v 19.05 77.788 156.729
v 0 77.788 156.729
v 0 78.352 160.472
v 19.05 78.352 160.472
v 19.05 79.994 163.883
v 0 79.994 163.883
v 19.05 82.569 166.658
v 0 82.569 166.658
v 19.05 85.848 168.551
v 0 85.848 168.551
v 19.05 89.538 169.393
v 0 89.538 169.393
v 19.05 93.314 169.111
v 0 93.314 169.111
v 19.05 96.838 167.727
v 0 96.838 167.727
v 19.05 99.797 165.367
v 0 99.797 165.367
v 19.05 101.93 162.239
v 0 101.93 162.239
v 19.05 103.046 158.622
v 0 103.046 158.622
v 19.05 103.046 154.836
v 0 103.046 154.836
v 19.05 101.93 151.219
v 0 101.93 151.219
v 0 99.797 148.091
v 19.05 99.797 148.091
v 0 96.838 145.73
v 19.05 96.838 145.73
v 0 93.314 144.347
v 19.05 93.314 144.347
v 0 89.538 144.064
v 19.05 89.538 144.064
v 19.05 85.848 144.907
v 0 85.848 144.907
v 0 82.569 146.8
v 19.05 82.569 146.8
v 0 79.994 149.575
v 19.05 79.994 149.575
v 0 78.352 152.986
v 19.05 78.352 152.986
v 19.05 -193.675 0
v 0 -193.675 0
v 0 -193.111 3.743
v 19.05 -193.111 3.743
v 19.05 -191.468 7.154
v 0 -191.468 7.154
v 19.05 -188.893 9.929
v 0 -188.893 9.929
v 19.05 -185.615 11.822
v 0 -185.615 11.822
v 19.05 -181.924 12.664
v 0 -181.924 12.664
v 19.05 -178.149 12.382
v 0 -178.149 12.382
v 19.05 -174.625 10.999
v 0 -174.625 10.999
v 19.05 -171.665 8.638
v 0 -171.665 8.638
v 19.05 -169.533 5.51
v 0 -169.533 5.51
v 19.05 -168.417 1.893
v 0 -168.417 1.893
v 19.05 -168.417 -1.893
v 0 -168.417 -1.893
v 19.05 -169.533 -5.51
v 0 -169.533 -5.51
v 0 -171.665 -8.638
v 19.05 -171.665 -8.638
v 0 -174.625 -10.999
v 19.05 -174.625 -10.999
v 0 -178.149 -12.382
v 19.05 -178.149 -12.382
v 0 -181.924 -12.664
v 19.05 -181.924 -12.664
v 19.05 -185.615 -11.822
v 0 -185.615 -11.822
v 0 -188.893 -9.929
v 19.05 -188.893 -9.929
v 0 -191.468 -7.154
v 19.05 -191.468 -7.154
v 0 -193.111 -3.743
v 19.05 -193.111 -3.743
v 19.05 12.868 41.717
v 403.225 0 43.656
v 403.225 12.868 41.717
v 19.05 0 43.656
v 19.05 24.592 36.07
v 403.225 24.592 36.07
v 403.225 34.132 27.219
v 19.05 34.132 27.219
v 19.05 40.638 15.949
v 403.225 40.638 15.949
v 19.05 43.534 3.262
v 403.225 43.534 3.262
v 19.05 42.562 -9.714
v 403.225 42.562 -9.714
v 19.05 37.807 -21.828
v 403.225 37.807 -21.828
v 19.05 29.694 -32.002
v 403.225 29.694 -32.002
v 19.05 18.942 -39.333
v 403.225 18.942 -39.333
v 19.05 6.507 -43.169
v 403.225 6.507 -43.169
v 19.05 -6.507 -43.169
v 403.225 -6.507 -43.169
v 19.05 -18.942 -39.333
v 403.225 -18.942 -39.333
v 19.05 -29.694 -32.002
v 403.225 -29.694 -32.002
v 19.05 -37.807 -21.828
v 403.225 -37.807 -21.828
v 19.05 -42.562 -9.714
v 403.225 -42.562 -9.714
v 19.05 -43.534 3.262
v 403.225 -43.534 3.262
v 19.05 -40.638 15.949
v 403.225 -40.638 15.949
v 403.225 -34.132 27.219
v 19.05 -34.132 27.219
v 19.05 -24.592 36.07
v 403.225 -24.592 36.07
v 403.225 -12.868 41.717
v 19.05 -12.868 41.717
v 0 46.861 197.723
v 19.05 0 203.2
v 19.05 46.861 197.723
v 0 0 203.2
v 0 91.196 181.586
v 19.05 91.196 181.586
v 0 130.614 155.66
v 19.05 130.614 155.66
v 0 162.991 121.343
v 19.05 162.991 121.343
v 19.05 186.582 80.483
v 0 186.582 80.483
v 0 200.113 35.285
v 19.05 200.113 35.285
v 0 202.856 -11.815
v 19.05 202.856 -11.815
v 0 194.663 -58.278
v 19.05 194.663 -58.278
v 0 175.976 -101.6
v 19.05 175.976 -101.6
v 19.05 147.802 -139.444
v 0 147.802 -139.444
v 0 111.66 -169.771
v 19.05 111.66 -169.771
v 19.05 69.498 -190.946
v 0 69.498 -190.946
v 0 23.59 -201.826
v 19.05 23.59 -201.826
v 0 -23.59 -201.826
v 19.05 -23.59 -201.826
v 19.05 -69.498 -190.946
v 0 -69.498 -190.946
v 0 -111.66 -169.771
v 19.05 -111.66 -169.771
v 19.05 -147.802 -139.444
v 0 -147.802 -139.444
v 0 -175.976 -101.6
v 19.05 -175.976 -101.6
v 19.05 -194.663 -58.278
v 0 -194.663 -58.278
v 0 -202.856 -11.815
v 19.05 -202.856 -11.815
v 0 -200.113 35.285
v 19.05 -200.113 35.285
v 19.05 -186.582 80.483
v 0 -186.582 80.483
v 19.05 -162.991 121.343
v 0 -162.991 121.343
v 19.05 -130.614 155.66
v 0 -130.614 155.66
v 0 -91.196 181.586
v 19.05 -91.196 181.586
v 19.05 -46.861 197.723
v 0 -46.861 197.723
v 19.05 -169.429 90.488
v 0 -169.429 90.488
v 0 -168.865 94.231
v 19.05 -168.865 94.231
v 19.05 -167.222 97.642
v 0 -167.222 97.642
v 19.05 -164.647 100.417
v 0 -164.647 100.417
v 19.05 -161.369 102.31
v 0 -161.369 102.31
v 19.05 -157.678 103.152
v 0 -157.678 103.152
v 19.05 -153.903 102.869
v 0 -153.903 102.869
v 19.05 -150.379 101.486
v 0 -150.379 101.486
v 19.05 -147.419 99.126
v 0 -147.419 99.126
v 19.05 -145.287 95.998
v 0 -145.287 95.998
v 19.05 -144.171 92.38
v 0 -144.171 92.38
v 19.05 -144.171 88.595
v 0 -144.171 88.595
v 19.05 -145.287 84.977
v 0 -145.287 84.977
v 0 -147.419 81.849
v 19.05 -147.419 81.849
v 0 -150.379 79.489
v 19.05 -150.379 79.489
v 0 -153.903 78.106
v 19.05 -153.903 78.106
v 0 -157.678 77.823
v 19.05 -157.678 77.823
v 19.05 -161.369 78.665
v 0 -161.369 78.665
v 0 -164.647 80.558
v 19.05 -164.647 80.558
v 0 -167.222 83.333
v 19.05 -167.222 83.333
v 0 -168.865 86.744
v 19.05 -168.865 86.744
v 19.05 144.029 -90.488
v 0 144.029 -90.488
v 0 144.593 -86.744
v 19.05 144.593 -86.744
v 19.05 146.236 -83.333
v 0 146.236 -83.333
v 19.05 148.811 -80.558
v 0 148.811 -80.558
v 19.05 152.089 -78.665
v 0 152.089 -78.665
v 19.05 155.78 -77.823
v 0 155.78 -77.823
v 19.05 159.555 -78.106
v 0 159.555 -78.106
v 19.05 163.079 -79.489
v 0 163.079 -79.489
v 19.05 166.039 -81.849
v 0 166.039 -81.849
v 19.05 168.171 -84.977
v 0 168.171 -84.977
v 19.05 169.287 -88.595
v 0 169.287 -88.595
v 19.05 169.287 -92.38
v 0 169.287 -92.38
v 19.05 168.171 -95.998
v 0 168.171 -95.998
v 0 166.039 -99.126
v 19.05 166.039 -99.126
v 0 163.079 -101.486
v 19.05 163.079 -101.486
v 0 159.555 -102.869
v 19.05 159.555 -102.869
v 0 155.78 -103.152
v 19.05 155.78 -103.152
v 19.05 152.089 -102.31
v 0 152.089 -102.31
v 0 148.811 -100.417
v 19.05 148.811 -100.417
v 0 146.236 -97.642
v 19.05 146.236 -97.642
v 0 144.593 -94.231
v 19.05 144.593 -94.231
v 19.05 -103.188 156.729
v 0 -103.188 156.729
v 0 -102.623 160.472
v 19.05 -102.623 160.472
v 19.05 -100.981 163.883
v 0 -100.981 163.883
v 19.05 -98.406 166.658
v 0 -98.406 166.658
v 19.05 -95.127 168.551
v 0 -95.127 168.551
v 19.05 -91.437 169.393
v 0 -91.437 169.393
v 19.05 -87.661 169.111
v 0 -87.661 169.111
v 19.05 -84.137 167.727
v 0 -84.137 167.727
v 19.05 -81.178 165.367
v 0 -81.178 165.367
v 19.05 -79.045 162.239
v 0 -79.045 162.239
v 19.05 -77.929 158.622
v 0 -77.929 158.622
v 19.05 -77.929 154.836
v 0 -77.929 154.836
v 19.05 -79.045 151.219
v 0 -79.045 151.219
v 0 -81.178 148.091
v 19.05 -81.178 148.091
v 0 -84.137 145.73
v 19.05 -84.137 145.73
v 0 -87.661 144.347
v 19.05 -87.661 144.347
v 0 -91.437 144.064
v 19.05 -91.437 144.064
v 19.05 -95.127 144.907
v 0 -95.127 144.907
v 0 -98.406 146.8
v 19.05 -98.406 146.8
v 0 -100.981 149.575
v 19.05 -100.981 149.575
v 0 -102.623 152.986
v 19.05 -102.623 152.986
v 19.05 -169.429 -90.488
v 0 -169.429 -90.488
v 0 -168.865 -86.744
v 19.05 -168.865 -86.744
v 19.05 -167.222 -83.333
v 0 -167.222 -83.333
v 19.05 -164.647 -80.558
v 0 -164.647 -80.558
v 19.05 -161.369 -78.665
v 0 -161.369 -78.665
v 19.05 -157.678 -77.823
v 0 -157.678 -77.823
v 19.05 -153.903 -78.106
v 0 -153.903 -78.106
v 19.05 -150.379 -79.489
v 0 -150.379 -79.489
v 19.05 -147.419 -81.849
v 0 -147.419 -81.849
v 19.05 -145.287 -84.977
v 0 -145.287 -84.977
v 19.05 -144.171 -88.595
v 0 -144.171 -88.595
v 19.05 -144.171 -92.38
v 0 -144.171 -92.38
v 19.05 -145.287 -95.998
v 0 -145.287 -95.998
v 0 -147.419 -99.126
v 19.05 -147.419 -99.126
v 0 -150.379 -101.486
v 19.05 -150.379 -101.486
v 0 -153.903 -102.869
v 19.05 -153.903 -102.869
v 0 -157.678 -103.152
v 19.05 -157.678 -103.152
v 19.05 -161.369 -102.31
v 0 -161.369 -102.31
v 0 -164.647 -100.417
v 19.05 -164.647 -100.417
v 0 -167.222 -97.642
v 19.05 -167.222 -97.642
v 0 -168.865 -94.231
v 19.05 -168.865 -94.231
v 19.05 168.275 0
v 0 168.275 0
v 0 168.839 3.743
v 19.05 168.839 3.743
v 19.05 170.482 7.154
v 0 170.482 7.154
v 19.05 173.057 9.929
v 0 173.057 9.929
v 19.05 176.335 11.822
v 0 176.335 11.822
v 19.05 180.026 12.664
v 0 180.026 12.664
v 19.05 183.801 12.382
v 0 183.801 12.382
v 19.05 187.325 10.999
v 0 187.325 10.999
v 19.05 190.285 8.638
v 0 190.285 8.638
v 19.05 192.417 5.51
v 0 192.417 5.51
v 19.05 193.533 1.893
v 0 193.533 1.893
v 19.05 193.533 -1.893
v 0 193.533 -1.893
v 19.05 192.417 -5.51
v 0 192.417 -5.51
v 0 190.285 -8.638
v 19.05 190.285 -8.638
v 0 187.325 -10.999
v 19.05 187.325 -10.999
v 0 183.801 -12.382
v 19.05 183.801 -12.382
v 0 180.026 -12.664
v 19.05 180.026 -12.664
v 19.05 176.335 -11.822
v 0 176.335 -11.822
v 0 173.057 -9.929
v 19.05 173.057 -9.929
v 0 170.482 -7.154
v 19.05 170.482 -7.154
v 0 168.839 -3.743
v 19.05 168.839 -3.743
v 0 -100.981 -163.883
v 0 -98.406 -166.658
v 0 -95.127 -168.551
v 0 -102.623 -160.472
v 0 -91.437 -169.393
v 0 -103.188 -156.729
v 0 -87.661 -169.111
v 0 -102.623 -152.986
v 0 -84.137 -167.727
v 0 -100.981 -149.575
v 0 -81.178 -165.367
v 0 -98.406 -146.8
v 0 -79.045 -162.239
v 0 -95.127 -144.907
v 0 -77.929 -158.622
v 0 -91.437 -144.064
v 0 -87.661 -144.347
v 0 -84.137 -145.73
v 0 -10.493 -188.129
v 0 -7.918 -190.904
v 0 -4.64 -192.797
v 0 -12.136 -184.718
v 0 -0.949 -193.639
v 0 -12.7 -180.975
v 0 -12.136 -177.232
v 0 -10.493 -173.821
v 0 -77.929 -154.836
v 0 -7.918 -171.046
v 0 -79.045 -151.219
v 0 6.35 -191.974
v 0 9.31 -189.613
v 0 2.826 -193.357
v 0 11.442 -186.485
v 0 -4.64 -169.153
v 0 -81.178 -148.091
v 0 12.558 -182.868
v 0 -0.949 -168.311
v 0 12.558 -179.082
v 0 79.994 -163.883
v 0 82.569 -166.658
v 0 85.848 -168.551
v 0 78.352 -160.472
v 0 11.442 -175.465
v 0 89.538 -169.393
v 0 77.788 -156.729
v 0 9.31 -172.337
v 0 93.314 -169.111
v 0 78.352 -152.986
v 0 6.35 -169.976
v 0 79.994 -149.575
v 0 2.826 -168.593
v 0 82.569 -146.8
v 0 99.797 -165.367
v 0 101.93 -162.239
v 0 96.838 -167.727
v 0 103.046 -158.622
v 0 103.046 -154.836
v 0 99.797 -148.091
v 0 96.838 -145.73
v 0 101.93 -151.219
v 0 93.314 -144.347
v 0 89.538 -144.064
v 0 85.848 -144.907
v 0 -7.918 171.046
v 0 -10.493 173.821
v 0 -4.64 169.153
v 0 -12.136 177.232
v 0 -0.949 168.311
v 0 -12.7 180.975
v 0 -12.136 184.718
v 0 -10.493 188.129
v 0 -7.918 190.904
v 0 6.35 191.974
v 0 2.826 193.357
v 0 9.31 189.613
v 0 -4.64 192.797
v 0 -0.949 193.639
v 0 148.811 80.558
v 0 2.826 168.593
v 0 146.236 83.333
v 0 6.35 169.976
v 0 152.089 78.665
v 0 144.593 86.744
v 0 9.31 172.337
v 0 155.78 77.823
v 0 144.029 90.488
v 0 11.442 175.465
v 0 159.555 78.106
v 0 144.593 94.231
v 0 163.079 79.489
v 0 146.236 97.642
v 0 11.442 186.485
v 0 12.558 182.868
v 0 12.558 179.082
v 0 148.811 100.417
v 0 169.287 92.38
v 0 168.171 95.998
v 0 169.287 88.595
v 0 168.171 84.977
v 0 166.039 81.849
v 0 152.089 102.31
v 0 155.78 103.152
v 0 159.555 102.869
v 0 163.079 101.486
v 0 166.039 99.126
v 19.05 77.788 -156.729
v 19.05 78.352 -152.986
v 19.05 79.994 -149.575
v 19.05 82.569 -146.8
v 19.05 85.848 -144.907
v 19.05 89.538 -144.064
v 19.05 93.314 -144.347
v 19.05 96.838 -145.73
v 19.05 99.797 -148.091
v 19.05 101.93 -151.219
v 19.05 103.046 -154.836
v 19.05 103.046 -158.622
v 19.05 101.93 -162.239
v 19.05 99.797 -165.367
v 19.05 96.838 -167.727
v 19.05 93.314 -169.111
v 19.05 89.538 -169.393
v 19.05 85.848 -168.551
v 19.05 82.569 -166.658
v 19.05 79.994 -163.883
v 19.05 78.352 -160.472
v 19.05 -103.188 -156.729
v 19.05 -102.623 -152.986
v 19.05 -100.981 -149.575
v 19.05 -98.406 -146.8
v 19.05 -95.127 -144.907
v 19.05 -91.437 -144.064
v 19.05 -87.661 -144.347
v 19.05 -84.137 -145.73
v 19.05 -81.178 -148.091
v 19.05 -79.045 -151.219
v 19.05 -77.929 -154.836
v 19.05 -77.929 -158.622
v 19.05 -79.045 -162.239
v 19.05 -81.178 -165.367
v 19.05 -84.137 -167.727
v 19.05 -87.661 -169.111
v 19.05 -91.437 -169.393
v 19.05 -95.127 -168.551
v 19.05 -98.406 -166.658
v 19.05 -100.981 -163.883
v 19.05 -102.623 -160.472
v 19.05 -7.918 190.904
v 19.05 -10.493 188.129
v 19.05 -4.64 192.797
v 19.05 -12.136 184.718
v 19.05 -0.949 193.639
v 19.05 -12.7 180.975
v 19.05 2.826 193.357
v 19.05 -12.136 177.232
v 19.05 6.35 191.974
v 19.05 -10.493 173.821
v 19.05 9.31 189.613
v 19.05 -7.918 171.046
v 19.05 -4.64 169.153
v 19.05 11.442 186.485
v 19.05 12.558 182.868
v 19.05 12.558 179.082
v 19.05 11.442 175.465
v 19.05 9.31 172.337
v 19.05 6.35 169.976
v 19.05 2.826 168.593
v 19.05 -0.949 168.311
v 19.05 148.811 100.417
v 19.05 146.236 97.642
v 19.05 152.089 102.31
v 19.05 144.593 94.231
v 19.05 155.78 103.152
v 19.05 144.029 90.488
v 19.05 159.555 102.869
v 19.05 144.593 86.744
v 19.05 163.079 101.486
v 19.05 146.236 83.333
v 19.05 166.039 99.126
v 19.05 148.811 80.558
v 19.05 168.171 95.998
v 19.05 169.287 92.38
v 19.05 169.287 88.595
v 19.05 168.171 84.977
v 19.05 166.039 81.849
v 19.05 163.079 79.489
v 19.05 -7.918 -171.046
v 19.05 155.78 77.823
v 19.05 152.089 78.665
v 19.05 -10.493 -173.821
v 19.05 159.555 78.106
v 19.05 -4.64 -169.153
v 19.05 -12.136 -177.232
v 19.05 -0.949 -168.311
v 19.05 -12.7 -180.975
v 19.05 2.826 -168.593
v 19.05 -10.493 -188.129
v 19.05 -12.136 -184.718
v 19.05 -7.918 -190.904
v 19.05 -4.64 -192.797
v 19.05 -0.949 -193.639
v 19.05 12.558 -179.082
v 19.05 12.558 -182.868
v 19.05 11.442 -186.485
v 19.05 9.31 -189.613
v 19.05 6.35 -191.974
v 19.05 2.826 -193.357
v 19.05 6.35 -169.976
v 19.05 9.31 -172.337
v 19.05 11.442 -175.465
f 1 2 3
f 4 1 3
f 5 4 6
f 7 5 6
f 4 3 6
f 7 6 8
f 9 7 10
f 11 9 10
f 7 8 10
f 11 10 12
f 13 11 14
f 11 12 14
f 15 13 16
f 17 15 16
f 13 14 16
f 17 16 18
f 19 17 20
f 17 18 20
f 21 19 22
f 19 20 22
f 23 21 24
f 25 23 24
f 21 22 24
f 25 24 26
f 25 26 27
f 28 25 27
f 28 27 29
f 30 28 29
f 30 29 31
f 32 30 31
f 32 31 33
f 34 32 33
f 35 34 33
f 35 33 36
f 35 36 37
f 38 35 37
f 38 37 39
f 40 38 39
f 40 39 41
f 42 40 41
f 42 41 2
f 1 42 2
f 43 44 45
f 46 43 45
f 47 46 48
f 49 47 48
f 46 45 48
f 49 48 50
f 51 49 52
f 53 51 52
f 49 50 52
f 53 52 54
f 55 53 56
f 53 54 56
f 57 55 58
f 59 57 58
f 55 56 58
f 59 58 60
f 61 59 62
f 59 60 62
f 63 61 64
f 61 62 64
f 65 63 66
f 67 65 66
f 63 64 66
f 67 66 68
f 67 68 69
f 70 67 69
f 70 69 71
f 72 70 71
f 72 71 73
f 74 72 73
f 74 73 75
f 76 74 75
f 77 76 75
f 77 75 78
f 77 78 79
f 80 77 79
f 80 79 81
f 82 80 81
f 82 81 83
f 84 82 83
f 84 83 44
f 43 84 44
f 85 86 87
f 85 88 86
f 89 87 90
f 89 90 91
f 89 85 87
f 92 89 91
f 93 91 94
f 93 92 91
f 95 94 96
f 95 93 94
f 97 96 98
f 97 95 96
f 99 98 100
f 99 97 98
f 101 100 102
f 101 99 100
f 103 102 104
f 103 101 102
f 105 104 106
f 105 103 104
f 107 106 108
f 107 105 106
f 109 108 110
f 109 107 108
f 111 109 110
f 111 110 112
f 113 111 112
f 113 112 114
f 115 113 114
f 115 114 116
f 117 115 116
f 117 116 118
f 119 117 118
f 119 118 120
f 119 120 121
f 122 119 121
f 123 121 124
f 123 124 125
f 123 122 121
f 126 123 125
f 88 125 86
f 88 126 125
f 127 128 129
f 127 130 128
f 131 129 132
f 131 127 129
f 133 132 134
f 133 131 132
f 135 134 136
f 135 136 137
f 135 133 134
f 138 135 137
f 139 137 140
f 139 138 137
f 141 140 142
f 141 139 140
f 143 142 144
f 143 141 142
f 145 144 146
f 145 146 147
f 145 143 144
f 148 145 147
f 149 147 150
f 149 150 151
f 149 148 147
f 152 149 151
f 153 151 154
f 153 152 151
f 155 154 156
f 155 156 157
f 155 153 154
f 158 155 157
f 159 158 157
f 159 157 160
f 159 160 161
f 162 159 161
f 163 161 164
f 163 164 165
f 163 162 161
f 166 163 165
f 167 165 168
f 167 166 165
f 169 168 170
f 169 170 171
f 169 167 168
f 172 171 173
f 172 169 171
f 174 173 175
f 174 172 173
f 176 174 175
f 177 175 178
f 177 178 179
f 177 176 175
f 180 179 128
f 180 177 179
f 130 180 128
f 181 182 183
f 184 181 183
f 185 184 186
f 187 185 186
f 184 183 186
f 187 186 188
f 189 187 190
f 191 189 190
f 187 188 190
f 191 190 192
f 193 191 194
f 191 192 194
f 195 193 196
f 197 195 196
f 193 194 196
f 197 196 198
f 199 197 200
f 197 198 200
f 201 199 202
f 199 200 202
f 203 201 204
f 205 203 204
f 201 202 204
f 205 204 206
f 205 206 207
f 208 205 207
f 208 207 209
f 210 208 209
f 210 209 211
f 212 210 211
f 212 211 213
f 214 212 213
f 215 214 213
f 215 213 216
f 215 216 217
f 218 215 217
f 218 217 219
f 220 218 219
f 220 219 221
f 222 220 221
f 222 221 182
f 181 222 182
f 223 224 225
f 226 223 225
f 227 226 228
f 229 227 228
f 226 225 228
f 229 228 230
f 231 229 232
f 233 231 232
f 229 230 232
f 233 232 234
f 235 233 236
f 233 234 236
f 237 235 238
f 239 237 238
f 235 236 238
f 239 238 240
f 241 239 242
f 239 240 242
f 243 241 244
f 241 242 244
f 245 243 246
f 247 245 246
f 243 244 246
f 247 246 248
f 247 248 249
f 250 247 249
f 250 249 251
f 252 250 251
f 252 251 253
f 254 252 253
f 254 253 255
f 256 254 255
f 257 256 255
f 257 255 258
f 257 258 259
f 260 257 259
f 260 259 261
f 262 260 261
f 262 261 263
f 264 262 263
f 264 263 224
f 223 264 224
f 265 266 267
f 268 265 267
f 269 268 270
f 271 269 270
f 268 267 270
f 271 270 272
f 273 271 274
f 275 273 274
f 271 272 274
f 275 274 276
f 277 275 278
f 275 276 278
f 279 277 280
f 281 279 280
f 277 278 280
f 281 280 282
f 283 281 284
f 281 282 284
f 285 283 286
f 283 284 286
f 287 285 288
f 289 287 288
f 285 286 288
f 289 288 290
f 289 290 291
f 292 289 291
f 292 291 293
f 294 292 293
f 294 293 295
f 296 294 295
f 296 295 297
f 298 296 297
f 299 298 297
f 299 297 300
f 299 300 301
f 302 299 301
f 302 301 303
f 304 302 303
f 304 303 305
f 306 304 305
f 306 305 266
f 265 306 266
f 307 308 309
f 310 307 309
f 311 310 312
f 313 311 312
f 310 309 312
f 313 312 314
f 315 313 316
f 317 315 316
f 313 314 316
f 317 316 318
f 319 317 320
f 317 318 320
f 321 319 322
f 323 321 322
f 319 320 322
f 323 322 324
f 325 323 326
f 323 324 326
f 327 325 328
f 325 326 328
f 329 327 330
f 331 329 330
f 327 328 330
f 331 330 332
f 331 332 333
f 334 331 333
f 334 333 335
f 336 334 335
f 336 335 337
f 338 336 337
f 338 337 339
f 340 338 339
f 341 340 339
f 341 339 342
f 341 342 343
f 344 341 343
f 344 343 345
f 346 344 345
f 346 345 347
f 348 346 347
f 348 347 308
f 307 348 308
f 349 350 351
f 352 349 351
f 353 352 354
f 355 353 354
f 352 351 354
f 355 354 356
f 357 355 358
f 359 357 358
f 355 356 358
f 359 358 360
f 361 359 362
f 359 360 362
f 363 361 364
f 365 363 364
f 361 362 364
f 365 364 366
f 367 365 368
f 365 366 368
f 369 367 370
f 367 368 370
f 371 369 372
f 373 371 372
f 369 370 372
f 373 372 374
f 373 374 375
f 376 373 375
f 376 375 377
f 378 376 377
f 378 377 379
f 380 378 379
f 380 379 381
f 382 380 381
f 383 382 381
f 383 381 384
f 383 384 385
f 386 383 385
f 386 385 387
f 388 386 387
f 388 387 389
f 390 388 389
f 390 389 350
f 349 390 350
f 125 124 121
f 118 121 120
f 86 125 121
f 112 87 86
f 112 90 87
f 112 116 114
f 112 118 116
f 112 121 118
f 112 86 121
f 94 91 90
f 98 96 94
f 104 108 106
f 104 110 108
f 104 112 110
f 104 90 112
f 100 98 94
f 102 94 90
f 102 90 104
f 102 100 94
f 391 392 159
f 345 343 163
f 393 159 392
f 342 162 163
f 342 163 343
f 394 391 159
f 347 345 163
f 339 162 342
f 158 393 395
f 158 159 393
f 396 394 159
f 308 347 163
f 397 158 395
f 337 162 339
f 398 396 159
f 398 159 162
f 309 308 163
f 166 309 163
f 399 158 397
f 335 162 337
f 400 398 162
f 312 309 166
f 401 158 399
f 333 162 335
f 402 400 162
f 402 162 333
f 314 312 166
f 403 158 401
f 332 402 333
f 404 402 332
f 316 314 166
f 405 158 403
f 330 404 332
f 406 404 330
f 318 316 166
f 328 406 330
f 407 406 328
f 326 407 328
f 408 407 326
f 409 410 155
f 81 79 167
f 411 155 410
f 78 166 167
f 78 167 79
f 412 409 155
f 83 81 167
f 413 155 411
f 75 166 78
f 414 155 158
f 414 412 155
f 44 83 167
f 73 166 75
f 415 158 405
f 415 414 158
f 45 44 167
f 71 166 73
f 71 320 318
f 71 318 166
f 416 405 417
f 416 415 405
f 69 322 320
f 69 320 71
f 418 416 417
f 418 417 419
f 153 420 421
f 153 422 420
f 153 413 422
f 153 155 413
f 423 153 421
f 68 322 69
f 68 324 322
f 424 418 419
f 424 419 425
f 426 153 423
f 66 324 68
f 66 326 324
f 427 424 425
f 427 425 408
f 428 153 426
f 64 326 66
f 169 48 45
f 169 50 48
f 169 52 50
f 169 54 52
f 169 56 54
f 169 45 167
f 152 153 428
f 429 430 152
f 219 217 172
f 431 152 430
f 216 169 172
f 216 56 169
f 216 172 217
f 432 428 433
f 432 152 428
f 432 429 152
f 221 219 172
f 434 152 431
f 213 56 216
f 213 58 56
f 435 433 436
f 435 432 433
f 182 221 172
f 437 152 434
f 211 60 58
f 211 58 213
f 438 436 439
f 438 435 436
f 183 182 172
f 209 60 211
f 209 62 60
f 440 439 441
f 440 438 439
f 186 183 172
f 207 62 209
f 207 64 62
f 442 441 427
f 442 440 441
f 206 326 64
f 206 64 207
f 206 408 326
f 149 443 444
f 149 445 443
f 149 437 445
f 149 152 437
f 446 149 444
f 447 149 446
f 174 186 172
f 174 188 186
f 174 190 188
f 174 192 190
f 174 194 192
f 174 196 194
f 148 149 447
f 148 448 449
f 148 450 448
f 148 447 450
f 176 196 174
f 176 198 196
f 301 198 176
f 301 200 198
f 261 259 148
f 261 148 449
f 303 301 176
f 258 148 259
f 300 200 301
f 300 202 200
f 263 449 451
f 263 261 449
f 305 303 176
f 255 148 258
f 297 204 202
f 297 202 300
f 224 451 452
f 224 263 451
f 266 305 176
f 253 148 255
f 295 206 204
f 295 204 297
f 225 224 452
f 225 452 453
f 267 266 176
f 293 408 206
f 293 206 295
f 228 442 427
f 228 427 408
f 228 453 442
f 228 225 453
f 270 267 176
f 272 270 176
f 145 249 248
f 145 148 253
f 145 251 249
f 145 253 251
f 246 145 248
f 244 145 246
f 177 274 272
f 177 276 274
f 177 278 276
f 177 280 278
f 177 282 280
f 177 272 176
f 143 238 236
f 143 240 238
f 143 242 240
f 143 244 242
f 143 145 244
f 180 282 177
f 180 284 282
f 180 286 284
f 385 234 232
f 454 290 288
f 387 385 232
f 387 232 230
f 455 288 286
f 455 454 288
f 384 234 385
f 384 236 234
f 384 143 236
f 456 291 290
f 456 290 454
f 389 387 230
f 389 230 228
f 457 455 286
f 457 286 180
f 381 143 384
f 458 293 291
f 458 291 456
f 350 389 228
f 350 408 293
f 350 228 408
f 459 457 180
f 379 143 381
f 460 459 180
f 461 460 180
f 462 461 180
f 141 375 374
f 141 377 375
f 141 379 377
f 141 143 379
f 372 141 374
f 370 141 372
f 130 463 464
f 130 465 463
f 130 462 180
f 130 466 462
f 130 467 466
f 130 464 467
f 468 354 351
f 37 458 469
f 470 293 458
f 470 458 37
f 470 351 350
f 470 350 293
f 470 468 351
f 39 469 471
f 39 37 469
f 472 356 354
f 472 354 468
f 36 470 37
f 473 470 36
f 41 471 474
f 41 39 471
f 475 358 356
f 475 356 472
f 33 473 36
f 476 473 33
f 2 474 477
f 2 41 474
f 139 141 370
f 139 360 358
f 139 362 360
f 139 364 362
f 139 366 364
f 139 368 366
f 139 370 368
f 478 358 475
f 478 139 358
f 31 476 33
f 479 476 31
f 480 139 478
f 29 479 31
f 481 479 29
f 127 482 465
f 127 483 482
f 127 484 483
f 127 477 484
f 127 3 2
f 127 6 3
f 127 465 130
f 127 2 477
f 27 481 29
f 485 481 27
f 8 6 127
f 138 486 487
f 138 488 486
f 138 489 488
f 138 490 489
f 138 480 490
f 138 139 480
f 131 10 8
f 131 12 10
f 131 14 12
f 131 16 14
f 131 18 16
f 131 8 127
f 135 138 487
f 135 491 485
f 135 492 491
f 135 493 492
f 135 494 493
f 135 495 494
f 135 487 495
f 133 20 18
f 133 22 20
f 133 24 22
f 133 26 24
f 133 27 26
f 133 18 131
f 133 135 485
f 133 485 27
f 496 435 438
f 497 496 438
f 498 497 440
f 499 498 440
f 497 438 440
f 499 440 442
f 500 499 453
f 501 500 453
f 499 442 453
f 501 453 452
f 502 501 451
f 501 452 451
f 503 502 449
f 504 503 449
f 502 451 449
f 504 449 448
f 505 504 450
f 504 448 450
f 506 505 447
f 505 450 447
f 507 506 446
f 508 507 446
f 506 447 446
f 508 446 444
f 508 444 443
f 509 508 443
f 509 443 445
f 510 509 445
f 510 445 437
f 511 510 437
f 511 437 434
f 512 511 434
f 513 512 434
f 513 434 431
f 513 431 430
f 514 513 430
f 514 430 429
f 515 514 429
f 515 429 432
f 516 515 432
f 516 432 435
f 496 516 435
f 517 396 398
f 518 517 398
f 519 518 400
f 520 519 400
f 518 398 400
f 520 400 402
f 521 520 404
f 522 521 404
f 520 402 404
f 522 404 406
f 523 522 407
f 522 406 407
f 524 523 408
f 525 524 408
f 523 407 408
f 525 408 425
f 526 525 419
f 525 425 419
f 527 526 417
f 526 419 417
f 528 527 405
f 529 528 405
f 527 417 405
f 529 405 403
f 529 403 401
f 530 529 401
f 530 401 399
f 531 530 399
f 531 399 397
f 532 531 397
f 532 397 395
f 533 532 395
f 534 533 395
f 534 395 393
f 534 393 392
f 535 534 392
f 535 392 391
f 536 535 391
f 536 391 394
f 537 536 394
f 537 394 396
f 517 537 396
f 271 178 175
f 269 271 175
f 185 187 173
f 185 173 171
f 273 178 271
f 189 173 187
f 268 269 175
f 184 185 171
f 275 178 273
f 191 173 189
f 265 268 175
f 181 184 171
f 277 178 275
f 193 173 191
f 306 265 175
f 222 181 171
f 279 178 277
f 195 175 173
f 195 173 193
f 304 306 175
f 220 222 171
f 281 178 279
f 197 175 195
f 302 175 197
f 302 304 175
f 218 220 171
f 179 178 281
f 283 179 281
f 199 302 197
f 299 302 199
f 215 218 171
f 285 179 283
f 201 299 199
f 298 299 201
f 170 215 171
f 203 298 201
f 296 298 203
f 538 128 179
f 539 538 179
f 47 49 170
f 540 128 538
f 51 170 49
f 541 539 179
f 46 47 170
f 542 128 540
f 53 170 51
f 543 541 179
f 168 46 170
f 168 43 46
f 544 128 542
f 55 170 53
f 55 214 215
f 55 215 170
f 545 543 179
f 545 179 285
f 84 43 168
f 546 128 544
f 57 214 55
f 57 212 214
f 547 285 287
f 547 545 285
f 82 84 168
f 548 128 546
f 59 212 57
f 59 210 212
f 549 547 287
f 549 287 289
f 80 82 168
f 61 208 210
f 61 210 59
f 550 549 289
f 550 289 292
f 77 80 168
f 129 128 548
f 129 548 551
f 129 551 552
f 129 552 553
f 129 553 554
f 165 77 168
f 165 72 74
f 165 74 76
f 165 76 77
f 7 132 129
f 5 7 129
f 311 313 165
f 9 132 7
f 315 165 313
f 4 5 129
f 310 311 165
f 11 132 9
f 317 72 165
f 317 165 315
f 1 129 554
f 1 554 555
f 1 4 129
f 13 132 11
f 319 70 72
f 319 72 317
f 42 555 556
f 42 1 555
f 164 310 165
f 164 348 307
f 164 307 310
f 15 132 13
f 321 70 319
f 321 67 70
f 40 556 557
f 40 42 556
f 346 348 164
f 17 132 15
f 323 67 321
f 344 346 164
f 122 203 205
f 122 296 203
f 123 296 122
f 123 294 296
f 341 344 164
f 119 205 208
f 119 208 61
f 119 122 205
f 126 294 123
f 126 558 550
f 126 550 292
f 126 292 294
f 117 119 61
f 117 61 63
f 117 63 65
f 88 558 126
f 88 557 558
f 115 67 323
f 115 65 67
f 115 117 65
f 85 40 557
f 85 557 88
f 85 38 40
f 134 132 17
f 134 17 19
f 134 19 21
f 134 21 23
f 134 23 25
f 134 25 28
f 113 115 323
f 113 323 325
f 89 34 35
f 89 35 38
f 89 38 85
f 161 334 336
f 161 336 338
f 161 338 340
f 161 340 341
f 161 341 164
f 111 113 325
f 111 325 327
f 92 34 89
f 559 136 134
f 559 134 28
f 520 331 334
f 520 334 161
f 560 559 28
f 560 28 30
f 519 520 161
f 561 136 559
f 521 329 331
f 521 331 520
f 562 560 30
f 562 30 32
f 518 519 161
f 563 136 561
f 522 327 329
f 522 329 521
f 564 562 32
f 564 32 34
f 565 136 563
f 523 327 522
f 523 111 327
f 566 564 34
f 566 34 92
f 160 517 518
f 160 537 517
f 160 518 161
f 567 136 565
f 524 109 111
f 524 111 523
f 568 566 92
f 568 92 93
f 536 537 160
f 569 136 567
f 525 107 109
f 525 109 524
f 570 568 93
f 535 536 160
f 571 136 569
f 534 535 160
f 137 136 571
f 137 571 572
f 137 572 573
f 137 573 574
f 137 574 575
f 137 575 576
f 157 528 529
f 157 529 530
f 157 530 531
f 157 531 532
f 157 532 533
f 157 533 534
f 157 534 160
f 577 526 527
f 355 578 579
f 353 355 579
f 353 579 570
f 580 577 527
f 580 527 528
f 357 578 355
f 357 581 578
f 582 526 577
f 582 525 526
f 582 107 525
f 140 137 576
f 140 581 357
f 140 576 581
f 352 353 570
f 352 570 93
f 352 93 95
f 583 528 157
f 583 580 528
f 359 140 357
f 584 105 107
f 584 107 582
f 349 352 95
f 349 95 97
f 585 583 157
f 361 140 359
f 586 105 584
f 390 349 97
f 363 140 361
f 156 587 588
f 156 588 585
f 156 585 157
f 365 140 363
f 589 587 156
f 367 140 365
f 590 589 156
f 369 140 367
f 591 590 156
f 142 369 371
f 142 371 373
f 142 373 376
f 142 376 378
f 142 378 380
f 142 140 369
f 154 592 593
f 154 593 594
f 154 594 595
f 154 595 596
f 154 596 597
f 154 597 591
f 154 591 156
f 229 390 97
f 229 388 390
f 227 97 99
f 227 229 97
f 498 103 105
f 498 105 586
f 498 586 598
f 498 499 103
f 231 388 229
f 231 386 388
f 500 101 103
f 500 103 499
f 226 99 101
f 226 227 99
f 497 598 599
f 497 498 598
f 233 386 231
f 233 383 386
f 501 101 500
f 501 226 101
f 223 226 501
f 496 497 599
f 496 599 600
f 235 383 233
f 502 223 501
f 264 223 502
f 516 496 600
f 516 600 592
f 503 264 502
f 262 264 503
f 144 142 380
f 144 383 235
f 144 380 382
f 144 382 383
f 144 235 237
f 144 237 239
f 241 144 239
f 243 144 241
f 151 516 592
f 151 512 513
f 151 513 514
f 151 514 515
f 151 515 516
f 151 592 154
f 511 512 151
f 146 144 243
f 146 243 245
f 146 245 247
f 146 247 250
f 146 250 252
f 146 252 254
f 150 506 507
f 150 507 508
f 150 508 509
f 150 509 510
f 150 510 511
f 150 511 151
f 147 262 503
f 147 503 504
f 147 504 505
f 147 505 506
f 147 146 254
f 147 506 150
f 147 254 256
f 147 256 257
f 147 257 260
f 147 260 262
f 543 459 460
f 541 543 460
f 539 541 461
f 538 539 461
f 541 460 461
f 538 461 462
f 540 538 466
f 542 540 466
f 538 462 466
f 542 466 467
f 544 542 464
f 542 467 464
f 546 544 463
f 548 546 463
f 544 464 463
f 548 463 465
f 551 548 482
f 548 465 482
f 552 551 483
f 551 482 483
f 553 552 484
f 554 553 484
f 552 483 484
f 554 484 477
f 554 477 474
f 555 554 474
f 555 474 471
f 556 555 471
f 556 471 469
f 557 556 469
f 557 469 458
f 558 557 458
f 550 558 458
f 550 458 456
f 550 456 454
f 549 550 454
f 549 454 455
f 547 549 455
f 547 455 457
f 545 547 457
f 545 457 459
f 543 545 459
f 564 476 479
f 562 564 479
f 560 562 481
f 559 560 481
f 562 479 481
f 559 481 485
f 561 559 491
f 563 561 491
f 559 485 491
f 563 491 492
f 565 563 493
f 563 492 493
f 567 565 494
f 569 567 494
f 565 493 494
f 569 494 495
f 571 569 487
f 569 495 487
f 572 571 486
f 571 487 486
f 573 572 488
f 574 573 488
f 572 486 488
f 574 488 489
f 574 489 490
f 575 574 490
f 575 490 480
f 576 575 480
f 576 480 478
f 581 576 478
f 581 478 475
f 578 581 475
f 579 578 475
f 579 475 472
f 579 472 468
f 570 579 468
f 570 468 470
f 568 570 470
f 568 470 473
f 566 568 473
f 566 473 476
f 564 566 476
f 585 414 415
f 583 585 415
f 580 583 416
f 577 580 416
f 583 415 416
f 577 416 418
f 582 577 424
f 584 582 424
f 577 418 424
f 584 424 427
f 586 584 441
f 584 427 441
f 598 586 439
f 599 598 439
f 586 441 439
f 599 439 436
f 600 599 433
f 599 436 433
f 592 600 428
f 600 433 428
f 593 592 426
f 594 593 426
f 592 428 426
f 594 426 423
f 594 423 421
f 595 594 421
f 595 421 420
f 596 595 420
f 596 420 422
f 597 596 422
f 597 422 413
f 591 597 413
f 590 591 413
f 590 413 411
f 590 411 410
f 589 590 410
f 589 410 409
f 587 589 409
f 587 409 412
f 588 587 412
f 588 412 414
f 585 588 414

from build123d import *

# Parameters (mm, degrees)
F3_D = 25.4


with BuildPart() as f1:
    # F0 (on Front) → F1 (revolve)
    with BuildSketch(Plane.XZ):
        Polygon((0, 203.2), (0, 0), (403.225, 0), (403.225, 43.65625), (19.05, 43.65625), (19.05, 203.2), align=None)
    revolve(axis=Axis((201.6125, 0, 0), (-1, 0, 0)))

    # F3 (through all)
    with Locations(Plane.YZ.offset(19.05)):
        with Locations((0, 180.975), (90.4875, 156.728947), (156.728947, 90.4875), (180.975, 0), (156.728947, -90.4875), (90.4875, -156.728947), (0, -180.975), (-90.4875, -156.728947), (-156.728947, -90.4875), (-180.975, 0), (-156.728947, 90.4875), (-90.4875, 156.728947)):
            Hole(F3_D / 2)


solid = f1.part
